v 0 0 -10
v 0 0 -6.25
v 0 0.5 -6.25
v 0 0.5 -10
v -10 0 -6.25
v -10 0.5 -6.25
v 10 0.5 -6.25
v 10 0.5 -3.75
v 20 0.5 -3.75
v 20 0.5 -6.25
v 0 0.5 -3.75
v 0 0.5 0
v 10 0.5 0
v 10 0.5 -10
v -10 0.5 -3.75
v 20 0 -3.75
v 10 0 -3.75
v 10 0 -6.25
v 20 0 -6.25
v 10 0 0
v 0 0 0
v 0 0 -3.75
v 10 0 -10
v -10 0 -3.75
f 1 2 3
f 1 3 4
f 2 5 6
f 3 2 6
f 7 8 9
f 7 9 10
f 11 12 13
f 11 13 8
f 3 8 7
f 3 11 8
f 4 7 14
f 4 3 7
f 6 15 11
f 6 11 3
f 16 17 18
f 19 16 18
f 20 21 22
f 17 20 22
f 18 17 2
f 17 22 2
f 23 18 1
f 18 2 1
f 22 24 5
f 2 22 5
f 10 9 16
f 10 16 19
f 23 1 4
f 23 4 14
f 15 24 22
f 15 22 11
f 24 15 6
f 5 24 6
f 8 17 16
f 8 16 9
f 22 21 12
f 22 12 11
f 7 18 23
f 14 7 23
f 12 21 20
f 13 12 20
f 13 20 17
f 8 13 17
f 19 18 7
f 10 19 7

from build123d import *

# Parameters (mm, degrees)
CROQUIS1_W                   = 10
CROQUIS1_H                   = 10
SALIENTE_EXTRUIR1_DEPTH      = 0.5
SALIENTE_EXTRUIR2_DEPTH      = 10
SALIENTE_EXTRUIR2_DEPTH_BACK = 20
CROQUIS2_W                   = 2.5
CROQUIS2_H                   = 0.5


with BuildPart() as part:
    # Croquis1 → Saliente-Extruir1 (new body)
    with BuildSketch(Plane(origin=(0, 0, 0), x_dir=(1, 0, 0), z_dir=(0, 1, 0))):
        with Locations((5, 5)):
            Rectangle(CROQUIS1_W, CROQUIS1_H)
    extrude(amount=SALIENTE_EXTRUIR1_DEPTH)

    # Croquis2 → Saliente-Extruir2 (add, two sides: drawn at the far end of the back side and taken through both)
    with BuildSketch(Plane(origin=(10, 0, 0), x_dir=(0, 0, -1), z_dir=(1, 0, 0)).offset(-SALIENTE_EXTRUIR2_DEPTH_BACK)):
        with Locations((5, 0.25)):
            Rectangle(CROQUIS2_W, CROQUIS2_H)
    extrude(amount=SALIENTE_EXTRUIR2_DEPTH + SALIENTE_EXTRUIR2_DEPTH_BACK)


solid = part.part
